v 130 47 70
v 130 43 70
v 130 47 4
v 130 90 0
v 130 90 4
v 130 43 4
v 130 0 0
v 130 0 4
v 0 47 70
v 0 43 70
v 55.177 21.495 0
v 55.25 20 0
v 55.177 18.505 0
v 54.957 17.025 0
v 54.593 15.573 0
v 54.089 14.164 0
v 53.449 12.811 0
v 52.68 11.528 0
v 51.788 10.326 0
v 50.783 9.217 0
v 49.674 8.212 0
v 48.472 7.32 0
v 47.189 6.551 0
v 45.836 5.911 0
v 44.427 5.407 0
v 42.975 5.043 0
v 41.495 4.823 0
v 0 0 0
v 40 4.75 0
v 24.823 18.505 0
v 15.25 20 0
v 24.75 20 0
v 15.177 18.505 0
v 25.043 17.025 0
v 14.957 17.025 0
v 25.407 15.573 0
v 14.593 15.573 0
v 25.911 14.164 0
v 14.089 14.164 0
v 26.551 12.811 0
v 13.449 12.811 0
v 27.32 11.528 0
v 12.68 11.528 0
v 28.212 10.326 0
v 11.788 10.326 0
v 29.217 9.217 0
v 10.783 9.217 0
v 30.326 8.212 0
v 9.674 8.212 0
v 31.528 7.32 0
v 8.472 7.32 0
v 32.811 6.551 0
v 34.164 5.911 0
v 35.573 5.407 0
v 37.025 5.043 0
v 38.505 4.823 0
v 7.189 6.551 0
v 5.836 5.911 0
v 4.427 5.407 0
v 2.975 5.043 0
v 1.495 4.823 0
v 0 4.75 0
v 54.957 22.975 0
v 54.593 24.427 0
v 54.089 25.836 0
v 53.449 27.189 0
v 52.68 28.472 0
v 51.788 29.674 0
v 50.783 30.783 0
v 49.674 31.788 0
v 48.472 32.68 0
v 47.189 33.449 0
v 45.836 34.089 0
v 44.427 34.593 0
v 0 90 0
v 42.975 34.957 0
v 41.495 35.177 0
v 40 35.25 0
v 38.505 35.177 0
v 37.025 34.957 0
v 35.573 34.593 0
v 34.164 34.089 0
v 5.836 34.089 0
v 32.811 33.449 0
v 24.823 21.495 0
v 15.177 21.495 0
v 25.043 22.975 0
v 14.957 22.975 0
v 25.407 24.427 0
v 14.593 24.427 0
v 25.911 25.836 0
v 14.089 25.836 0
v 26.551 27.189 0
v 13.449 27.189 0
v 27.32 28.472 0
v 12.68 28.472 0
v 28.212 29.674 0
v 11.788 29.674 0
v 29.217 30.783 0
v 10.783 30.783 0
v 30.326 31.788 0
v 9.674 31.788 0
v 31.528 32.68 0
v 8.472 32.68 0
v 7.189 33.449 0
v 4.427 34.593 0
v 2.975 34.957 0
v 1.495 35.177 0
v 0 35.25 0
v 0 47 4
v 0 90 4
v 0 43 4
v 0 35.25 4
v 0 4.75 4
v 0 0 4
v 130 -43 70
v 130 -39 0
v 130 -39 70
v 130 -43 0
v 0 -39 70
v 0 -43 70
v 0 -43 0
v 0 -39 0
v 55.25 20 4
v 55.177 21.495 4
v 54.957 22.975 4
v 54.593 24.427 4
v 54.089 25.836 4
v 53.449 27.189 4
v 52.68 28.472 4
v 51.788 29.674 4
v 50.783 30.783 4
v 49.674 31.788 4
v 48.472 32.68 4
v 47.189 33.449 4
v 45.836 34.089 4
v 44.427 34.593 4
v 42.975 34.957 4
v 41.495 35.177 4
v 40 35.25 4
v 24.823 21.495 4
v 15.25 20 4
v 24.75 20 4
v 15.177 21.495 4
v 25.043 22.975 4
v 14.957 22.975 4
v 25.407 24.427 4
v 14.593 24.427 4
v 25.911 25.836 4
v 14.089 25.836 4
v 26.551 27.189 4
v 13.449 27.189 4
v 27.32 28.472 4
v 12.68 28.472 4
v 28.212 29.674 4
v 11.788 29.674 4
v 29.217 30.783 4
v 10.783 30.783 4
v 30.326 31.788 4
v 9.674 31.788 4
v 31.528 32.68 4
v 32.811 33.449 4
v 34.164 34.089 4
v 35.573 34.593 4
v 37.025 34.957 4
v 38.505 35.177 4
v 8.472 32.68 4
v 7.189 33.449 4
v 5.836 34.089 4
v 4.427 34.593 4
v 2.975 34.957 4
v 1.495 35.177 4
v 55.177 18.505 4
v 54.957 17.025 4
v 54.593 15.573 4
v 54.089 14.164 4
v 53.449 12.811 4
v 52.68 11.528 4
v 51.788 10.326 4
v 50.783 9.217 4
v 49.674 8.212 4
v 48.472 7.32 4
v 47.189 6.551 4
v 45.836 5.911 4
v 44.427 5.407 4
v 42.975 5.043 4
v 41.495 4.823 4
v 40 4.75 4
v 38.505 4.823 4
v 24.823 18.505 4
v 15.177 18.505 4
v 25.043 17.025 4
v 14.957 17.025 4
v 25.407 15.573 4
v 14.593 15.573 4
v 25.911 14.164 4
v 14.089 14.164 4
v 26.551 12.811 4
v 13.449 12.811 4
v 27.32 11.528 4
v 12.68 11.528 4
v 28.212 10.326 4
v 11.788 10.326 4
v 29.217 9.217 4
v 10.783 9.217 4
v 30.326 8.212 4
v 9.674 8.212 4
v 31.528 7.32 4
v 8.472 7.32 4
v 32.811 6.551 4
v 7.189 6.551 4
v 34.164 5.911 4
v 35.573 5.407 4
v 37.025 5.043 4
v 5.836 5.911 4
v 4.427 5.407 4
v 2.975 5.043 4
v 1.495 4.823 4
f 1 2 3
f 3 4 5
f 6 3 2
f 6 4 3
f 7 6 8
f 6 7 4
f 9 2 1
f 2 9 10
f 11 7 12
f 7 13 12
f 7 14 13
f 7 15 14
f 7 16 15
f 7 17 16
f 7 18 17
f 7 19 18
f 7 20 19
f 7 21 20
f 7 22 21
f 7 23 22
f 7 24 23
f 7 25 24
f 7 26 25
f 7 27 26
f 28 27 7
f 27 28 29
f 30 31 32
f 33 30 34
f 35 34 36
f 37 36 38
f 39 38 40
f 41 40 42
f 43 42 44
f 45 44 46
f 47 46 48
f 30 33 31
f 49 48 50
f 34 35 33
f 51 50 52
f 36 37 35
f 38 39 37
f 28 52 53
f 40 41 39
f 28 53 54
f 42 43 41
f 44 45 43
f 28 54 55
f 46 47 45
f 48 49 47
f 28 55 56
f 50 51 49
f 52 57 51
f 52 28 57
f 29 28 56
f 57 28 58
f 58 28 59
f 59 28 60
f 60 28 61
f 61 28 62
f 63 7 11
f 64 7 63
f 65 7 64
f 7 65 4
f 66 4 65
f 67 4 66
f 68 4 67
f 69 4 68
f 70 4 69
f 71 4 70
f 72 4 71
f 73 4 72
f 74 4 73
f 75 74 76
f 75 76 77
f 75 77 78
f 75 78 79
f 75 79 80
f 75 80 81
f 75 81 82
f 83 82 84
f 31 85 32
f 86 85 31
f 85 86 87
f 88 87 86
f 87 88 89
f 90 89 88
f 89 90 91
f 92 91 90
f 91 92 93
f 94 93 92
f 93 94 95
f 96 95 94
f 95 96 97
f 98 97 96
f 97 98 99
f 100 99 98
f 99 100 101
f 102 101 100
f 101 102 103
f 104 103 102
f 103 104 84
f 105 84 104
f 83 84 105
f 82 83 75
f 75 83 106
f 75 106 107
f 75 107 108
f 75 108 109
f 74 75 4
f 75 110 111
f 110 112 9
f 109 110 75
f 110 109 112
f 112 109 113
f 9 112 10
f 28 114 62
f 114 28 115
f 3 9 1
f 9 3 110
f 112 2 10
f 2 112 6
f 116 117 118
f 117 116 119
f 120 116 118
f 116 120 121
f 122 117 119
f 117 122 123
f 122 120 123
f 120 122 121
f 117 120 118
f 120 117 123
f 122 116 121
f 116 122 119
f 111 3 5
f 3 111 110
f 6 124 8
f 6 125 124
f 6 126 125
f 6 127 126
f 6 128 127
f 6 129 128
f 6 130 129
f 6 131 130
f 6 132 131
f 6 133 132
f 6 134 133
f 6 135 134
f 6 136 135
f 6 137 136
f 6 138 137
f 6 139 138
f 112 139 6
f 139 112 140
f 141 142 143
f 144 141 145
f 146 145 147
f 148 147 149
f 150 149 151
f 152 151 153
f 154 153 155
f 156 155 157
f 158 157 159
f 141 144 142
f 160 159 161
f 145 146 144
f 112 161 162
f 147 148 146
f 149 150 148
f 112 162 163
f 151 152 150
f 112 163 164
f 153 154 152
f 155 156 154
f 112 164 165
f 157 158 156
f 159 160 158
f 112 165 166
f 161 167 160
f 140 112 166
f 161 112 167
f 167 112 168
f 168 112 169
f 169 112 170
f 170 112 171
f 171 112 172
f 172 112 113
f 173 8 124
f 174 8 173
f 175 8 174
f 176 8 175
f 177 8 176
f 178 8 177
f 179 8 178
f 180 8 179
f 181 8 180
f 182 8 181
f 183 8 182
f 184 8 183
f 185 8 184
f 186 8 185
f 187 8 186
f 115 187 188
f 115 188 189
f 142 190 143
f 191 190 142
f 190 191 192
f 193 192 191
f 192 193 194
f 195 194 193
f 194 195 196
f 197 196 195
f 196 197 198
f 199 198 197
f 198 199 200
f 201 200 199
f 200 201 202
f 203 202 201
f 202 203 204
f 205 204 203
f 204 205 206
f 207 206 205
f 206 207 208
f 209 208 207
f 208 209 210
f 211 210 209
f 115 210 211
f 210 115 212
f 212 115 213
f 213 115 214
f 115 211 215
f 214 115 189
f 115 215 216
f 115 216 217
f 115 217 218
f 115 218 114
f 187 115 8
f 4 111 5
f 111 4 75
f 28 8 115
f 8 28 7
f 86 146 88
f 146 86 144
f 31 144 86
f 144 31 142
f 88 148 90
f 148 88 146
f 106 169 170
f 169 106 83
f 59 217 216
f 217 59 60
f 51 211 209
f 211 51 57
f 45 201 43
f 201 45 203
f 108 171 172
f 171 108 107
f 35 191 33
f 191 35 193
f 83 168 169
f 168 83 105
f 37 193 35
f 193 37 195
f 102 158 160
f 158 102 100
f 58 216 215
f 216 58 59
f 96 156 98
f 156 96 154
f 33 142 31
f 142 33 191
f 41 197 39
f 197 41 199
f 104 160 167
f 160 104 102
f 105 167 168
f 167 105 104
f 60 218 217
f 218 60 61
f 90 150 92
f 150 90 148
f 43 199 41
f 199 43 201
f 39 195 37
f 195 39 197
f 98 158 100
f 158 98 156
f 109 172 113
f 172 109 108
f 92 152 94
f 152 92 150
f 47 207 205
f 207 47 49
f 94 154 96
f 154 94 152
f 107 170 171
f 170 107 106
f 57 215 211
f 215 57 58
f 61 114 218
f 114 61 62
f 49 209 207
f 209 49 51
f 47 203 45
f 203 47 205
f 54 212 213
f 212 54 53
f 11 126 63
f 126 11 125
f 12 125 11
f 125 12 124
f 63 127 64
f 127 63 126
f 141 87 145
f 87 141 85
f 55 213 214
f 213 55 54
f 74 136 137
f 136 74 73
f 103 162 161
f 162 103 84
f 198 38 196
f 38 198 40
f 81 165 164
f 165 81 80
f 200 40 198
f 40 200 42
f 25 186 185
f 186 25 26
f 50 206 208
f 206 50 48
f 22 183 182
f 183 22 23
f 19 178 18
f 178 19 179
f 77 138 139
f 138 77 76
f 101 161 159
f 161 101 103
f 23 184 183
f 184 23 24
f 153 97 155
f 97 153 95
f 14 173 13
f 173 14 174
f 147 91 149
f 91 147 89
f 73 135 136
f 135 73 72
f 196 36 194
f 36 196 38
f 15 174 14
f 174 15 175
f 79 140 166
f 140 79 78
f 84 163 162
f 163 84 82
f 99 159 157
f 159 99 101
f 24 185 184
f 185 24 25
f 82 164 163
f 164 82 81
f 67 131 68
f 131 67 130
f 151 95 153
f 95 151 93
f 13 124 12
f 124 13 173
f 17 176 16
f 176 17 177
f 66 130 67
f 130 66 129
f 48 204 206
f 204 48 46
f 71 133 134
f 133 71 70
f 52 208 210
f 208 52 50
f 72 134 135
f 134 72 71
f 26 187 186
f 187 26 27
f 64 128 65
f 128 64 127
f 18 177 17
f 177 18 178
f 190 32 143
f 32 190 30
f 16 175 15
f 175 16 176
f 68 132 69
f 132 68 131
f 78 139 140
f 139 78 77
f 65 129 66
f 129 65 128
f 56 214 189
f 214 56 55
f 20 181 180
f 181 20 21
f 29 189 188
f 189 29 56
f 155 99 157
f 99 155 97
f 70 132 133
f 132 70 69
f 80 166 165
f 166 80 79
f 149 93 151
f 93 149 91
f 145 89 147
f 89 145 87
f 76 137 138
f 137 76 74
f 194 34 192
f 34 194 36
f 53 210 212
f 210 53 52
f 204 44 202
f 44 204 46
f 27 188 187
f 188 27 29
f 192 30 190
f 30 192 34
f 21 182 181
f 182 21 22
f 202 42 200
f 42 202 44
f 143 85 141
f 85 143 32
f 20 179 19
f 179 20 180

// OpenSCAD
// --- Dimensions in mm ---

plate_length_X = 130;      // Total length along X axis of the base plate
plate_width_Y = 90;        // Total width along Y axis of the base plate
plate_thickness = 4;       // Thickness of the base plate (Z dimension)
tube_hole_diameter = 30.5; // Diameter of the holes for Falcon tubes
tube_hole_radius = tube_hole_diameter / 2;

wall_height = 70;          // Height the side walls rise to from the base plate
wall_thickness_Y = 4;     // Thickness of the long side walls (in Y direction)

spacing_X = 40;            // Center-to-center spacing between holes along X
spacing_Y = 40;            // Center-to-center spacing between holes along Y

// --- Global Settings ---
$fn = 64; // High resolution for curves

// --- Calculations ---

// Center coordinates of the holes (relative to plate center)
// Plate is centered at (0, 0). X runs from -65 to 65. Y runs from -45 to 45.

// X positions: 3 tubes along X (indices 1, 2, 3)
x_positions = [
    -spacing_X, // Center of the first tube group (relative to center line)
     0,          // Center of the second tube group
     spacing_X  // Center of the third tube group
];

// Y positions: 2 rows along Y (indices 1, 2)
y_positions = [
    -spacing_Y / 2, // Adjusting for centering two rows symmetrically around Y=0
     spacing_Y / 2
];


// --- Module Definitions ---

// Creates the main base plate structure
module base_plate() {
    cube([plate_length_X, plate_width_Y, plate_thickness]);
}

// Creates one through-hole centered at (x, y)
module tube_hole(x_center, y_center) {
    translate([x_center, y_center, -0.1]) // Start slightly below Z=0 for clean cutting
    cylinder(h = plate_thickness + 0.2, r = tube_hole_radius);
}

// Creates the two long side walls rising from the base plate
module side_wall() {
    // The wall is 130mm (X) long and 4mm thick (Y). It rises to Z=70.
    // Since it's flush with the edge, we position it along X = +/- (plate_width_Y / 2 - wall_thickness_Y/2)
    // However, the description says: "Two solid walls run along the two long edges of the plate: each wall is 130 mm long (X) and 4 mm thick (Y), flush with the plate's long edge"

    // The long edges are parallel to X axis. They are at Y = +/- (plate_width_Y / 2).
    // Wall thickness is in Y direction, so it occupies a slice of width 4mm centered on the edge line.

    // Wall 1 (Positive Y side)
    translate([0, plate_width_Y/2 - wall_thickness_Y/2, 0]) {
        cube([plate_length_X, wall_thickness_Y, wall_height]);
    }

    // Wall 2 (Negative Y side)
    translate([0, -plate_width_Y/2 + wall_thickness_Y/2, 0]) {
        cube([plate_length_X, wall_thickness_Y, wall_height]);
    }
}


// --- Assembly ---

difference() {
    // 1. Base Plate (The main body)
    union() {
        base_plate();

        // 2. Side Walls (These extend up from the plate)
        side_wall();
    }

    // 3. Cutouts: Holes for tubes and material removal for walls if necessary (though side_wall is solid, we cut through it too)

    // A. Tube Holes (6 holes)
    for (i = [0 : len(x_positions)-1]) {
        for (j = [0 : len(y_positions)-1]) {
            // Calculate the actual center coordinates for the hole placement
            // X centers are relative to plate center. Y centers are relative to plate center.
            translate([x_positions[i], y_positions[j], 0]) {
                tube_hole(0, 0); // The tube_hole module is designed to be translated externally
            }
        }
    }

    // B. Cutting through the side walls (to ensure tubes pass through)
    // We need to cut holes through the entire structure where the tubes go.
    for (i = [0 : len(x_positions)-1]) {
        for (j = [0 : len(y_positions)-1]) {

            // Hole centered at X=x_positions[i], Y=y_positions[j]
            translate([x_positions[i], y_positions[j], -0.1]) {
                cylinder(h = wall_height + 2, r = tube_hole_radius);
            }
        }
    }

}
